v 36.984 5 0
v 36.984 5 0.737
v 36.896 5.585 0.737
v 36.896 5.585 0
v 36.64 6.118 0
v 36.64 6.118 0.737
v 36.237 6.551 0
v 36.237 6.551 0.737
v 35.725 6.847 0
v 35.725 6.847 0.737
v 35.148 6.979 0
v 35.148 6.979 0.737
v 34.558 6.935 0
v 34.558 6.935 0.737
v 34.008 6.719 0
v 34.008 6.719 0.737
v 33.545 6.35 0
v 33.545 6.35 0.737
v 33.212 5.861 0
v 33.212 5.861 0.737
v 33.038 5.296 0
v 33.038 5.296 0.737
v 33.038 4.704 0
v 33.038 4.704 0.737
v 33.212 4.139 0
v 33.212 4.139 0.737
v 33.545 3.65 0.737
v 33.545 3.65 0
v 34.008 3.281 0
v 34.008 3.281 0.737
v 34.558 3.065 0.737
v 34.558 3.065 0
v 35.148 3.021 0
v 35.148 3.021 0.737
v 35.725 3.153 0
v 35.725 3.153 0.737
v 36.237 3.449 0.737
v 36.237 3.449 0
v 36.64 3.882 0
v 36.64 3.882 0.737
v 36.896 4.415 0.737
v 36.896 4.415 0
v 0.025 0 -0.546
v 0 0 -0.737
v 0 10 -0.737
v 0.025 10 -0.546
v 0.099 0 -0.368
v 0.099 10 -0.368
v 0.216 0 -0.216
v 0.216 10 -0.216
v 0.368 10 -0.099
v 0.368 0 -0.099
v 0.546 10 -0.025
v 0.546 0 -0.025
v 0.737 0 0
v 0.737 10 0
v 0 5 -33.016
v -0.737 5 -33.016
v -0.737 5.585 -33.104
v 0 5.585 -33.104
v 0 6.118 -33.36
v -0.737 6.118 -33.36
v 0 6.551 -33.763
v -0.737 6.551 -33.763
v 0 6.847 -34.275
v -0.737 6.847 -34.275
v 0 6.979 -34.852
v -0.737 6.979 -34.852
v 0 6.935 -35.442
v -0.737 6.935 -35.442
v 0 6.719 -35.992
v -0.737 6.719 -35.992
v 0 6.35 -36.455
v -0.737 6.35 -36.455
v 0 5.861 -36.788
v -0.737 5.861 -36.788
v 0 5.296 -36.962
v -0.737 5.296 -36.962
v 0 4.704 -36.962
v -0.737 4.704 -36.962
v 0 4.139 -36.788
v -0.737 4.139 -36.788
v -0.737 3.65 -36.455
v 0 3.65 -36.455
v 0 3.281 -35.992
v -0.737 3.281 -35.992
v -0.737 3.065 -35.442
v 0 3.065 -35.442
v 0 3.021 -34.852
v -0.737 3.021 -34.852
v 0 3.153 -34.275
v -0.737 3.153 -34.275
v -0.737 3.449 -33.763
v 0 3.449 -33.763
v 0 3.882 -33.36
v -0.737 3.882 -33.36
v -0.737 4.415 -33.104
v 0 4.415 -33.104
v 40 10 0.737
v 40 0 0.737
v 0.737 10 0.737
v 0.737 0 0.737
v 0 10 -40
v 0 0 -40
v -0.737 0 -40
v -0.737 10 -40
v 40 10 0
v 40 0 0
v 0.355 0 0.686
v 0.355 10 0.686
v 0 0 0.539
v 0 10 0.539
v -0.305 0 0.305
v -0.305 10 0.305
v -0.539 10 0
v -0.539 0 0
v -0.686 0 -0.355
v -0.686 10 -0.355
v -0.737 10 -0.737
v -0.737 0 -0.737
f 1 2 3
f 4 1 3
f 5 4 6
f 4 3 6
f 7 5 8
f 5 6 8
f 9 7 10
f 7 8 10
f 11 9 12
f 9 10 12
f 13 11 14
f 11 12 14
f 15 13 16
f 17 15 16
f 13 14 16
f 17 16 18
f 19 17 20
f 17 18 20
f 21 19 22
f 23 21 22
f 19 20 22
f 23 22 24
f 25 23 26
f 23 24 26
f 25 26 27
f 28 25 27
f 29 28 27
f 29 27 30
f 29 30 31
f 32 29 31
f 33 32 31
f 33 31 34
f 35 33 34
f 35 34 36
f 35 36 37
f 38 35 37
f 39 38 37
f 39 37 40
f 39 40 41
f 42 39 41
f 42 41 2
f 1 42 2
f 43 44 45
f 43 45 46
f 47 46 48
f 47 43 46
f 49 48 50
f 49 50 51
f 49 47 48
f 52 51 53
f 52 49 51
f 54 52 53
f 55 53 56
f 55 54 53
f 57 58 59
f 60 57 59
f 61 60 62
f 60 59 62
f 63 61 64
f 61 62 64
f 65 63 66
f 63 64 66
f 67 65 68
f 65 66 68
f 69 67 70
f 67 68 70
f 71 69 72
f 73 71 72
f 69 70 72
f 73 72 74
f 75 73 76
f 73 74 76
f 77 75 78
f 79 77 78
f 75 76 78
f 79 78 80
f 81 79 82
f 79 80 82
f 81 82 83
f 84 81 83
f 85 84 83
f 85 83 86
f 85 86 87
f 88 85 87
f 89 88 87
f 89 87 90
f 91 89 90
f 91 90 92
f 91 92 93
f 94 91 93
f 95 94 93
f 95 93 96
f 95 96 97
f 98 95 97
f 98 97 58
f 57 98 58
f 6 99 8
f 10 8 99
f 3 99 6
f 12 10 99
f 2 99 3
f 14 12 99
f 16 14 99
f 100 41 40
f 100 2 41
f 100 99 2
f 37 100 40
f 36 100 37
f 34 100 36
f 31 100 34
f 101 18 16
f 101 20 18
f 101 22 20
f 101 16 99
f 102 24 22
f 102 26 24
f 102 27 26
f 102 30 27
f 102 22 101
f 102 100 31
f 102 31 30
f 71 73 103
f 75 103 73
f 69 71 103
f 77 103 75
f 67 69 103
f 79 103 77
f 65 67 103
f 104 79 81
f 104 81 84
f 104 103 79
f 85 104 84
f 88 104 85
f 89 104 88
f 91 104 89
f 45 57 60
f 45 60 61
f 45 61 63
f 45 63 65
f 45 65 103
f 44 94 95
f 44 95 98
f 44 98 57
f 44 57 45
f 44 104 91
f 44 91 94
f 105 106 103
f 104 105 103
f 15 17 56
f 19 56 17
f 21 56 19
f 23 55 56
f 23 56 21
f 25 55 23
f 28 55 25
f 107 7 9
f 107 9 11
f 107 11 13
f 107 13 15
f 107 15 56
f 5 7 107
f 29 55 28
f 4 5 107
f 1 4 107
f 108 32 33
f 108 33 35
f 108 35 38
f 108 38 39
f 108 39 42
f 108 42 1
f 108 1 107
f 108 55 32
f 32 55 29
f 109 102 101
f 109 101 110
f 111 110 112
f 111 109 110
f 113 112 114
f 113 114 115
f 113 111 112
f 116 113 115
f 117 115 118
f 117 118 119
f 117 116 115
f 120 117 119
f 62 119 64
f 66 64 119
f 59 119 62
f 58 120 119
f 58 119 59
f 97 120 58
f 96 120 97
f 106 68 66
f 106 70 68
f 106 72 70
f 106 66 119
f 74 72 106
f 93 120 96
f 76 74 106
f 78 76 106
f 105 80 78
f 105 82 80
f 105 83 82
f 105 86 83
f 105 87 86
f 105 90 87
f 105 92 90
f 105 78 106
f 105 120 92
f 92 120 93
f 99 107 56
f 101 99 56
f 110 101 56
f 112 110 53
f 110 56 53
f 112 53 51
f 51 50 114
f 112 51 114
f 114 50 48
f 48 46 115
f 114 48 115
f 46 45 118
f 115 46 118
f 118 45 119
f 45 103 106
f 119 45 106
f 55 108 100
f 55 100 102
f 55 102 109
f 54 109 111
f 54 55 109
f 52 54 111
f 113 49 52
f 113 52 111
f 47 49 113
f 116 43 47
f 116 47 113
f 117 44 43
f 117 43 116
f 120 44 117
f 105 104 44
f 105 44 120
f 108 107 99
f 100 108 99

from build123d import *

# Parameters (mm, degrees)
BASE_FLANGE1_DEPTH = 10
SKETCH6_R          = 1.984375
CUT_EXTRUDE1_DEPTH = 10
SKETCH7_R          = 1.984375
CUT_EXTRUDE2_DEPTH = 10


# Sheet-metal steps are written as plain solids
with BuildPart() as part:
    # Sketch1 → Base-Flange1 (new body)
    with BuildSketch(Plane(origin=(0, 0, 0), x_dir=(1, 0, 0), z_dir=(0, 1, 0))):
        with BuildLine():
            Line((0, 40), (0, 0.7366))
            ThreePointArc((0, 0.7366), (0.215745145, 0.215745145), (0.7366, 0))
            Line((0.7366, 0), (40, 0))
            Line((40, 0), (40, -0.7366))
            Line((40, -0.7366), (0.7366, -0.7366))
            ThreePointArc((0.7366, -0.7366), (-0.30510971, -0.30510971), (-0.7366, 0.7366))
            Line((-0.7366, 0.7366), (-0.7366, 40))
            Line((-0.7366, 40), (0, 40))
        make_face()
    extrude(amount=BASE_FLANGE1_DEPTH)

    # Sketch6 → Cut-Extrude1 (cut)
    with BuildSketch(Plane.XY.offset(0.7366)):
        with Locations((35, 5)):
            Circle(SKETCH6_R)
    extrude(amount=-CUT_EXTRUDE1_DEPTH, mode=Mode.SUBTRACT)

    # Sketch7 → Cut-Extrude2 (cut)
    with BuildSketch(Plane.ZY.offset(0.7366)):
        with Locations((-35, 5)):
            Circle(SKETCH7_R)
    extrude(amount=-CUT_EXTRUDE2_DEPTH, mode=Mode.SUBTRACT)


solid = part.part
